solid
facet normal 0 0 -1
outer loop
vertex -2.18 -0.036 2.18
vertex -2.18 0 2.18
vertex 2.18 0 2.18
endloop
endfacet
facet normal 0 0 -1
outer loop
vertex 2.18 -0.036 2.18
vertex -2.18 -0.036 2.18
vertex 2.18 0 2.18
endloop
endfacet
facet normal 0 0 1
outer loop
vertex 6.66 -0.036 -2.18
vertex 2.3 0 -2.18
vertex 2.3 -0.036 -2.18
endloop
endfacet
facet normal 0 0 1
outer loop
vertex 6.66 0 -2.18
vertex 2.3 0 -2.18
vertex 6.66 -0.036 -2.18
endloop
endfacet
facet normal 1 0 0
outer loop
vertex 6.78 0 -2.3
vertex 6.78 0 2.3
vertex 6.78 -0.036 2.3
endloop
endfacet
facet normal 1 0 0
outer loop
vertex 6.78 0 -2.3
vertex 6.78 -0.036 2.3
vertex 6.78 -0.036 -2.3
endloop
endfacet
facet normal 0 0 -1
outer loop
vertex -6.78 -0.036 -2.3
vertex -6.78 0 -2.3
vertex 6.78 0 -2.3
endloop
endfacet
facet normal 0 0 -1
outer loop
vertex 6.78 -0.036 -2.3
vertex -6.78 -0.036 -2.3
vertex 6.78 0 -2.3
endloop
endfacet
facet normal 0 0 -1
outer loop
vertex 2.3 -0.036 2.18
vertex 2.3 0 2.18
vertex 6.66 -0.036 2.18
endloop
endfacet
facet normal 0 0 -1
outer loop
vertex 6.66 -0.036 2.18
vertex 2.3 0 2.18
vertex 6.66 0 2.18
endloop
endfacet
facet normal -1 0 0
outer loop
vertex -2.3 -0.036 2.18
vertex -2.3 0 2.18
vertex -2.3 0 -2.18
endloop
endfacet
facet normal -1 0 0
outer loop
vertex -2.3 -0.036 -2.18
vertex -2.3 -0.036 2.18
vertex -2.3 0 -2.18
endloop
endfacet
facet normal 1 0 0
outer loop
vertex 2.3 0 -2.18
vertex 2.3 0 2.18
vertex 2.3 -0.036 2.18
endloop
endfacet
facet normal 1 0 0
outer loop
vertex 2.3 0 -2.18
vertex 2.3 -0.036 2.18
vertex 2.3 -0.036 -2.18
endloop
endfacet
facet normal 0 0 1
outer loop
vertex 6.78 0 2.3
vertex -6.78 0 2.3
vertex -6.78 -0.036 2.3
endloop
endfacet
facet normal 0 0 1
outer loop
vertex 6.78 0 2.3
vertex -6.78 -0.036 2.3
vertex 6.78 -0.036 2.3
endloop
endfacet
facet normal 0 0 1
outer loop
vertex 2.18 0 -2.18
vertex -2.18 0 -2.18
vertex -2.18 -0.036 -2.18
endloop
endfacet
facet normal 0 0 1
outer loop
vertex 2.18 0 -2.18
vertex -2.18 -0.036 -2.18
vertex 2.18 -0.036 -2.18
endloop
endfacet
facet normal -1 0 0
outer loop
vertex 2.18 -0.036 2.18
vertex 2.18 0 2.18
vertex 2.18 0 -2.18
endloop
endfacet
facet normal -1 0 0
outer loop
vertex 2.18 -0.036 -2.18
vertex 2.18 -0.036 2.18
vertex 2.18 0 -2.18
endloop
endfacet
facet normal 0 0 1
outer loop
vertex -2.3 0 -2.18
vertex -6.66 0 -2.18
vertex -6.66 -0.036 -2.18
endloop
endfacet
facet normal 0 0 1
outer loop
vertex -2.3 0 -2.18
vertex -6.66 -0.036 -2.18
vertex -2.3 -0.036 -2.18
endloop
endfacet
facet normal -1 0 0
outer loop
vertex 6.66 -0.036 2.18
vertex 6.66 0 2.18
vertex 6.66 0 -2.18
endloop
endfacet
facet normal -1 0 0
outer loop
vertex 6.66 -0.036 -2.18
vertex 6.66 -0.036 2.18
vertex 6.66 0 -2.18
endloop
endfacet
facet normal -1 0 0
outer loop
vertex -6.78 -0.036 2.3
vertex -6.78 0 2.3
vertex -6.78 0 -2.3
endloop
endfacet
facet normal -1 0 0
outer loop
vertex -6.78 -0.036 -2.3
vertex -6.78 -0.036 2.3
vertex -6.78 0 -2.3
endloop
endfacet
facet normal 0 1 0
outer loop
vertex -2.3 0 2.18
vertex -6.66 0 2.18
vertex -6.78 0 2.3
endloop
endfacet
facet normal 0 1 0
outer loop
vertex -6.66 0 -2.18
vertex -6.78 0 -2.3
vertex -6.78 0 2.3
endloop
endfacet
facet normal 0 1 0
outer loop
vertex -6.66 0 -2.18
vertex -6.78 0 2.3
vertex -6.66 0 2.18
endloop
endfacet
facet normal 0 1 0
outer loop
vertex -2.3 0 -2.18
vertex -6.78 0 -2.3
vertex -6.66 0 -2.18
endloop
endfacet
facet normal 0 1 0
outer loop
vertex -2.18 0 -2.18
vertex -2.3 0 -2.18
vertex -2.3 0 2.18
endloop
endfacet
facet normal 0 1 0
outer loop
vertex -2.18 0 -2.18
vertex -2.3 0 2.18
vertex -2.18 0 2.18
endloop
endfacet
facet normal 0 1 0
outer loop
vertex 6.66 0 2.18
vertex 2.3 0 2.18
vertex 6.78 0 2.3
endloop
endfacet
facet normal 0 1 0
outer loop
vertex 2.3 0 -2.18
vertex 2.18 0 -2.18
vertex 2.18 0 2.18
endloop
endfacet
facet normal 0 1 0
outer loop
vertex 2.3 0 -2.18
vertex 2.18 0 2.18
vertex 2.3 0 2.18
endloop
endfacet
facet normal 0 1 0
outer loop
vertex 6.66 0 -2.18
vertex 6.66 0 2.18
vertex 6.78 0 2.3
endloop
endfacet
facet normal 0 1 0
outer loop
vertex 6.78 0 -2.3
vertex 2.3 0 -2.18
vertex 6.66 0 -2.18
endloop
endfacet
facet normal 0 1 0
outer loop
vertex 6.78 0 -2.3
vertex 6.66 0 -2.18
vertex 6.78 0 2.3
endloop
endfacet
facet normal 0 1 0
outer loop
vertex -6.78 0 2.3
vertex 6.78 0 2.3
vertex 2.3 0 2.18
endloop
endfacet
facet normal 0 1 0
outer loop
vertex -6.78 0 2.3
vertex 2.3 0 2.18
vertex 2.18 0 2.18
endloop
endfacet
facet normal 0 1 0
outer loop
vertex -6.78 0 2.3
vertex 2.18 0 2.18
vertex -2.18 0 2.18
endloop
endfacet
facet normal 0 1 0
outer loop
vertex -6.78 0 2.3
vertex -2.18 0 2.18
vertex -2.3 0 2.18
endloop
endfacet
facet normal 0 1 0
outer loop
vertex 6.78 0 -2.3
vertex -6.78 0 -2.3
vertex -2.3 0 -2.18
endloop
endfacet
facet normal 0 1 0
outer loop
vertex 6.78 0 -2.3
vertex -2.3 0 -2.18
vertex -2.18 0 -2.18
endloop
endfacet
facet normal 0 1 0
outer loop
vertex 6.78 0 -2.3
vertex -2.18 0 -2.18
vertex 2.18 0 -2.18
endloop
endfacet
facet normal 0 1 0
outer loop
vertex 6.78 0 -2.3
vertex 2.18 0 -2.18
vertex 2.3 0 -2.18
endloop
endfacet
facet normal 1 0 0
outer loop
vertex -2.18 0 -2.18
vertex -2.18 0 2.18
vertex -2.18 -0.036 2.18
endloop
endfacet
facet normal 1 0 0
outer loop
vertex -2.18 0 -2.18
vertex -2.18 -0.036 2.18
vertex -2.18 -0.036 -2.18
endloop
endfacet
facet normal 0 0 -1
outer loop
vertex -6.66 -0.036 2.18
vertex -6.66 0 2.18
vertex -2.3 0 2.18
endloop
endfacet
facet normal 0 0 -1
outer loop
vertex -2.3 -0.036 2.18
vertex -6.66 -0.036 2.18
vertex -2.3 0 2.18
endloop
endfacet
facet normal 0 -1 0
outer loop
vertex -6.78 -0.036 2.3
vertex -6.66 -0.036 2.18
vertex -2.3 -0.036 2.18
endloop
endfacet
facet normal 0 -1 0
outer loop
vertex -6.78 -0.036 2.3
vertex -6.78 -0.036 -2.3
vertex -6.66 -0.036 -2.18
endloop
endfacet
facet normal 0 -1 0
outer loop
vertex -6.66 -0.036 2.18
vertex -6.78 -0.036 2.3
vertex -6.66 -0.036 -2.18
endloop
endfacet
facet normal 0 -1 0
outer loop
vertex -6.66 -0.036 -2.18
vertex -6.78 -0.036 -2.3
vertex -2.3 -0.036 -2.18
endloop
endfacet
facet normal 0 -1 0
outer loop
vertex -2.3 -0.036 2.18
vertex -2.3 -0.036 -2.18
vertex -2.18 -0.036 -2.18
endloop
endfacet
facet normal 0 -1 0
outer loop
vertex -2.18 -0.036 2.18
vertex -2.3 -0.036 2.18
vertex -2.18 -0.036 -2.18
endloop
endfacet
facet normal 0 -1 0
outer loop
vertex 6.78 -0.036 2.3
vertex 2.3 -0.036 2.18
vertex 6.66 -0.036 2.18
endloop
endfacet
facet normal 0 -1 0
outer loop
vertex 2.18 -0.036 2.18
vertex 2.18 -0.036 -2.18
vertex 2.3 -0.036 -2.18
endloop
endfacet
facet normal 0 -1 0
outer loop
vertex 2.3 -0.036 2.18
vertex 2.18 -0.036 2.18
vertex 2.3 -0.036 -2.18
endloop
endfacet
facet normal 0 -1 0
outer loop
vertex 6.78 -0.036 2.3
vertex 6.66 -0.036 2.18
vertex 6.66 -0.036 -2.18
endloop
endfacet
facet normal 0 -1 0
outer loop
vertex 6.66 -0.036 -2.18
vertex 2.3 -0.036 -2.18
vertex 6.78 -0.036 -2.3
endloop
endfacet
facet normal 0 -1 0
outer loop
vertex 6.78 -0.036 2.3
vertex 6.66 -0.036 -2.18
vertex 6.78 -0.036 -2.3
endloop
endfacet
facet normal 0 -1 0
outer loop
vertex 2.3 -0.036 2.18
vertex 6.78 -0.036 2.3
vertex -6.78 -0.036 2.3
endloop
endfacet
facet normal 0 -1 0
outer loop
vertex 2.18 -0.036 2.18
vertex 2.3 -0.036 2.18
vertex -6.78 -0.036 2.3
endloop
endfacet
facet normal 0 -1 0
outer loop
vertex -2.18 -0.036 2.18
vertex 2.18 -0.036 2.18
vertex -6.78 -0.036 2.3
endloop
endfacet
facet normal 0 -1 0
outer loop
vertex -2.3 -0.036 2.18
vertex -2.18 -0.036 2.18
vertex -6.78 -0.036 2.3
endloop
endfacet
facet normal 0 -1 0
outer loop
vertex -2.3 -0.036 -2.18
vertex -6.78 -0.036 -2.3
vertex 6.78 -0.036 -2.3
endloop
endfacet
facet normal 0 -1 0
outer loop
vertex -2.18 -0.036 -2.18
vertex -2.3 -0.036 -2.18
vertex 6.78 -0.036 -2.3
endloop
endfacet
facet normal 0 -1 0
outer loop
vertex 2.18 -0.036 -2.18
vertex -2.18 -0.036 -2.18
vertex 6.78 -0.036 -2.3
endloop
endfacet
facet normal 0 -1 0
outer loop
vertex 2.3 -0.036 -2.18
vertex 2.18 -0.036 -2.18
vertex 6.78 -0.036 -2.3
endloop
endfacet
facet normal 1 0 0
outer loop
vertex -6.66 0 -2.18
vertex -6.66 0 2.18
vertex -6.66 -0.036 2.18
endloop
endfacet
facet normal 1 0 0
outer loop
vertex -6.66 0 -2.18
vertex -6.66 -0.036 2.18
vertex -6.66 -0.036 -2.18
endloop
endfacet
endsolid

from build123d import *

# Parameters (mm, degrees)
SKETCH1_W         = 13.56
SKETCH1_H         = 4.6
BASE_DEPTH        = 0.036
SKETCH2_W         = 4.36
SKETCH2_H         = 4.36
CUTOUT_BASE_DEPTH = 0.036


with BuildPart() as part:
    # Sketch1 → Base (new body)
    with BuildSketch(Plane(origin=(0, 0, 0), x_dir=(1, 0, 0), z_dir=(0, 1, 0))):
        Rectangle(SKETCH1_W, SKETCH1_H)
    extrude(amount=-BASE_DEPTH)

    # Sketch2 → Cutout Base (cut)
    with BuildSketch(Plane(origin=(0, 0, 0), x_dir=(1, 0, 0), z_dir=(0, 1, 0))):
        Rectangle(SKETCH2_W, SKETCH2_H)
        with Locations((-4.48, 0)):
            Rectangle(SKETCH2_W, SKETCH2_H)
        with Locations((4.48, 0)):
            Rectangle(SKETCH2_W, SKETCH2_H)
    extrude(amount=-CUTOUT_BASE_DEPTH, mode=Mode.SUBTRACT)


solid = part.part
